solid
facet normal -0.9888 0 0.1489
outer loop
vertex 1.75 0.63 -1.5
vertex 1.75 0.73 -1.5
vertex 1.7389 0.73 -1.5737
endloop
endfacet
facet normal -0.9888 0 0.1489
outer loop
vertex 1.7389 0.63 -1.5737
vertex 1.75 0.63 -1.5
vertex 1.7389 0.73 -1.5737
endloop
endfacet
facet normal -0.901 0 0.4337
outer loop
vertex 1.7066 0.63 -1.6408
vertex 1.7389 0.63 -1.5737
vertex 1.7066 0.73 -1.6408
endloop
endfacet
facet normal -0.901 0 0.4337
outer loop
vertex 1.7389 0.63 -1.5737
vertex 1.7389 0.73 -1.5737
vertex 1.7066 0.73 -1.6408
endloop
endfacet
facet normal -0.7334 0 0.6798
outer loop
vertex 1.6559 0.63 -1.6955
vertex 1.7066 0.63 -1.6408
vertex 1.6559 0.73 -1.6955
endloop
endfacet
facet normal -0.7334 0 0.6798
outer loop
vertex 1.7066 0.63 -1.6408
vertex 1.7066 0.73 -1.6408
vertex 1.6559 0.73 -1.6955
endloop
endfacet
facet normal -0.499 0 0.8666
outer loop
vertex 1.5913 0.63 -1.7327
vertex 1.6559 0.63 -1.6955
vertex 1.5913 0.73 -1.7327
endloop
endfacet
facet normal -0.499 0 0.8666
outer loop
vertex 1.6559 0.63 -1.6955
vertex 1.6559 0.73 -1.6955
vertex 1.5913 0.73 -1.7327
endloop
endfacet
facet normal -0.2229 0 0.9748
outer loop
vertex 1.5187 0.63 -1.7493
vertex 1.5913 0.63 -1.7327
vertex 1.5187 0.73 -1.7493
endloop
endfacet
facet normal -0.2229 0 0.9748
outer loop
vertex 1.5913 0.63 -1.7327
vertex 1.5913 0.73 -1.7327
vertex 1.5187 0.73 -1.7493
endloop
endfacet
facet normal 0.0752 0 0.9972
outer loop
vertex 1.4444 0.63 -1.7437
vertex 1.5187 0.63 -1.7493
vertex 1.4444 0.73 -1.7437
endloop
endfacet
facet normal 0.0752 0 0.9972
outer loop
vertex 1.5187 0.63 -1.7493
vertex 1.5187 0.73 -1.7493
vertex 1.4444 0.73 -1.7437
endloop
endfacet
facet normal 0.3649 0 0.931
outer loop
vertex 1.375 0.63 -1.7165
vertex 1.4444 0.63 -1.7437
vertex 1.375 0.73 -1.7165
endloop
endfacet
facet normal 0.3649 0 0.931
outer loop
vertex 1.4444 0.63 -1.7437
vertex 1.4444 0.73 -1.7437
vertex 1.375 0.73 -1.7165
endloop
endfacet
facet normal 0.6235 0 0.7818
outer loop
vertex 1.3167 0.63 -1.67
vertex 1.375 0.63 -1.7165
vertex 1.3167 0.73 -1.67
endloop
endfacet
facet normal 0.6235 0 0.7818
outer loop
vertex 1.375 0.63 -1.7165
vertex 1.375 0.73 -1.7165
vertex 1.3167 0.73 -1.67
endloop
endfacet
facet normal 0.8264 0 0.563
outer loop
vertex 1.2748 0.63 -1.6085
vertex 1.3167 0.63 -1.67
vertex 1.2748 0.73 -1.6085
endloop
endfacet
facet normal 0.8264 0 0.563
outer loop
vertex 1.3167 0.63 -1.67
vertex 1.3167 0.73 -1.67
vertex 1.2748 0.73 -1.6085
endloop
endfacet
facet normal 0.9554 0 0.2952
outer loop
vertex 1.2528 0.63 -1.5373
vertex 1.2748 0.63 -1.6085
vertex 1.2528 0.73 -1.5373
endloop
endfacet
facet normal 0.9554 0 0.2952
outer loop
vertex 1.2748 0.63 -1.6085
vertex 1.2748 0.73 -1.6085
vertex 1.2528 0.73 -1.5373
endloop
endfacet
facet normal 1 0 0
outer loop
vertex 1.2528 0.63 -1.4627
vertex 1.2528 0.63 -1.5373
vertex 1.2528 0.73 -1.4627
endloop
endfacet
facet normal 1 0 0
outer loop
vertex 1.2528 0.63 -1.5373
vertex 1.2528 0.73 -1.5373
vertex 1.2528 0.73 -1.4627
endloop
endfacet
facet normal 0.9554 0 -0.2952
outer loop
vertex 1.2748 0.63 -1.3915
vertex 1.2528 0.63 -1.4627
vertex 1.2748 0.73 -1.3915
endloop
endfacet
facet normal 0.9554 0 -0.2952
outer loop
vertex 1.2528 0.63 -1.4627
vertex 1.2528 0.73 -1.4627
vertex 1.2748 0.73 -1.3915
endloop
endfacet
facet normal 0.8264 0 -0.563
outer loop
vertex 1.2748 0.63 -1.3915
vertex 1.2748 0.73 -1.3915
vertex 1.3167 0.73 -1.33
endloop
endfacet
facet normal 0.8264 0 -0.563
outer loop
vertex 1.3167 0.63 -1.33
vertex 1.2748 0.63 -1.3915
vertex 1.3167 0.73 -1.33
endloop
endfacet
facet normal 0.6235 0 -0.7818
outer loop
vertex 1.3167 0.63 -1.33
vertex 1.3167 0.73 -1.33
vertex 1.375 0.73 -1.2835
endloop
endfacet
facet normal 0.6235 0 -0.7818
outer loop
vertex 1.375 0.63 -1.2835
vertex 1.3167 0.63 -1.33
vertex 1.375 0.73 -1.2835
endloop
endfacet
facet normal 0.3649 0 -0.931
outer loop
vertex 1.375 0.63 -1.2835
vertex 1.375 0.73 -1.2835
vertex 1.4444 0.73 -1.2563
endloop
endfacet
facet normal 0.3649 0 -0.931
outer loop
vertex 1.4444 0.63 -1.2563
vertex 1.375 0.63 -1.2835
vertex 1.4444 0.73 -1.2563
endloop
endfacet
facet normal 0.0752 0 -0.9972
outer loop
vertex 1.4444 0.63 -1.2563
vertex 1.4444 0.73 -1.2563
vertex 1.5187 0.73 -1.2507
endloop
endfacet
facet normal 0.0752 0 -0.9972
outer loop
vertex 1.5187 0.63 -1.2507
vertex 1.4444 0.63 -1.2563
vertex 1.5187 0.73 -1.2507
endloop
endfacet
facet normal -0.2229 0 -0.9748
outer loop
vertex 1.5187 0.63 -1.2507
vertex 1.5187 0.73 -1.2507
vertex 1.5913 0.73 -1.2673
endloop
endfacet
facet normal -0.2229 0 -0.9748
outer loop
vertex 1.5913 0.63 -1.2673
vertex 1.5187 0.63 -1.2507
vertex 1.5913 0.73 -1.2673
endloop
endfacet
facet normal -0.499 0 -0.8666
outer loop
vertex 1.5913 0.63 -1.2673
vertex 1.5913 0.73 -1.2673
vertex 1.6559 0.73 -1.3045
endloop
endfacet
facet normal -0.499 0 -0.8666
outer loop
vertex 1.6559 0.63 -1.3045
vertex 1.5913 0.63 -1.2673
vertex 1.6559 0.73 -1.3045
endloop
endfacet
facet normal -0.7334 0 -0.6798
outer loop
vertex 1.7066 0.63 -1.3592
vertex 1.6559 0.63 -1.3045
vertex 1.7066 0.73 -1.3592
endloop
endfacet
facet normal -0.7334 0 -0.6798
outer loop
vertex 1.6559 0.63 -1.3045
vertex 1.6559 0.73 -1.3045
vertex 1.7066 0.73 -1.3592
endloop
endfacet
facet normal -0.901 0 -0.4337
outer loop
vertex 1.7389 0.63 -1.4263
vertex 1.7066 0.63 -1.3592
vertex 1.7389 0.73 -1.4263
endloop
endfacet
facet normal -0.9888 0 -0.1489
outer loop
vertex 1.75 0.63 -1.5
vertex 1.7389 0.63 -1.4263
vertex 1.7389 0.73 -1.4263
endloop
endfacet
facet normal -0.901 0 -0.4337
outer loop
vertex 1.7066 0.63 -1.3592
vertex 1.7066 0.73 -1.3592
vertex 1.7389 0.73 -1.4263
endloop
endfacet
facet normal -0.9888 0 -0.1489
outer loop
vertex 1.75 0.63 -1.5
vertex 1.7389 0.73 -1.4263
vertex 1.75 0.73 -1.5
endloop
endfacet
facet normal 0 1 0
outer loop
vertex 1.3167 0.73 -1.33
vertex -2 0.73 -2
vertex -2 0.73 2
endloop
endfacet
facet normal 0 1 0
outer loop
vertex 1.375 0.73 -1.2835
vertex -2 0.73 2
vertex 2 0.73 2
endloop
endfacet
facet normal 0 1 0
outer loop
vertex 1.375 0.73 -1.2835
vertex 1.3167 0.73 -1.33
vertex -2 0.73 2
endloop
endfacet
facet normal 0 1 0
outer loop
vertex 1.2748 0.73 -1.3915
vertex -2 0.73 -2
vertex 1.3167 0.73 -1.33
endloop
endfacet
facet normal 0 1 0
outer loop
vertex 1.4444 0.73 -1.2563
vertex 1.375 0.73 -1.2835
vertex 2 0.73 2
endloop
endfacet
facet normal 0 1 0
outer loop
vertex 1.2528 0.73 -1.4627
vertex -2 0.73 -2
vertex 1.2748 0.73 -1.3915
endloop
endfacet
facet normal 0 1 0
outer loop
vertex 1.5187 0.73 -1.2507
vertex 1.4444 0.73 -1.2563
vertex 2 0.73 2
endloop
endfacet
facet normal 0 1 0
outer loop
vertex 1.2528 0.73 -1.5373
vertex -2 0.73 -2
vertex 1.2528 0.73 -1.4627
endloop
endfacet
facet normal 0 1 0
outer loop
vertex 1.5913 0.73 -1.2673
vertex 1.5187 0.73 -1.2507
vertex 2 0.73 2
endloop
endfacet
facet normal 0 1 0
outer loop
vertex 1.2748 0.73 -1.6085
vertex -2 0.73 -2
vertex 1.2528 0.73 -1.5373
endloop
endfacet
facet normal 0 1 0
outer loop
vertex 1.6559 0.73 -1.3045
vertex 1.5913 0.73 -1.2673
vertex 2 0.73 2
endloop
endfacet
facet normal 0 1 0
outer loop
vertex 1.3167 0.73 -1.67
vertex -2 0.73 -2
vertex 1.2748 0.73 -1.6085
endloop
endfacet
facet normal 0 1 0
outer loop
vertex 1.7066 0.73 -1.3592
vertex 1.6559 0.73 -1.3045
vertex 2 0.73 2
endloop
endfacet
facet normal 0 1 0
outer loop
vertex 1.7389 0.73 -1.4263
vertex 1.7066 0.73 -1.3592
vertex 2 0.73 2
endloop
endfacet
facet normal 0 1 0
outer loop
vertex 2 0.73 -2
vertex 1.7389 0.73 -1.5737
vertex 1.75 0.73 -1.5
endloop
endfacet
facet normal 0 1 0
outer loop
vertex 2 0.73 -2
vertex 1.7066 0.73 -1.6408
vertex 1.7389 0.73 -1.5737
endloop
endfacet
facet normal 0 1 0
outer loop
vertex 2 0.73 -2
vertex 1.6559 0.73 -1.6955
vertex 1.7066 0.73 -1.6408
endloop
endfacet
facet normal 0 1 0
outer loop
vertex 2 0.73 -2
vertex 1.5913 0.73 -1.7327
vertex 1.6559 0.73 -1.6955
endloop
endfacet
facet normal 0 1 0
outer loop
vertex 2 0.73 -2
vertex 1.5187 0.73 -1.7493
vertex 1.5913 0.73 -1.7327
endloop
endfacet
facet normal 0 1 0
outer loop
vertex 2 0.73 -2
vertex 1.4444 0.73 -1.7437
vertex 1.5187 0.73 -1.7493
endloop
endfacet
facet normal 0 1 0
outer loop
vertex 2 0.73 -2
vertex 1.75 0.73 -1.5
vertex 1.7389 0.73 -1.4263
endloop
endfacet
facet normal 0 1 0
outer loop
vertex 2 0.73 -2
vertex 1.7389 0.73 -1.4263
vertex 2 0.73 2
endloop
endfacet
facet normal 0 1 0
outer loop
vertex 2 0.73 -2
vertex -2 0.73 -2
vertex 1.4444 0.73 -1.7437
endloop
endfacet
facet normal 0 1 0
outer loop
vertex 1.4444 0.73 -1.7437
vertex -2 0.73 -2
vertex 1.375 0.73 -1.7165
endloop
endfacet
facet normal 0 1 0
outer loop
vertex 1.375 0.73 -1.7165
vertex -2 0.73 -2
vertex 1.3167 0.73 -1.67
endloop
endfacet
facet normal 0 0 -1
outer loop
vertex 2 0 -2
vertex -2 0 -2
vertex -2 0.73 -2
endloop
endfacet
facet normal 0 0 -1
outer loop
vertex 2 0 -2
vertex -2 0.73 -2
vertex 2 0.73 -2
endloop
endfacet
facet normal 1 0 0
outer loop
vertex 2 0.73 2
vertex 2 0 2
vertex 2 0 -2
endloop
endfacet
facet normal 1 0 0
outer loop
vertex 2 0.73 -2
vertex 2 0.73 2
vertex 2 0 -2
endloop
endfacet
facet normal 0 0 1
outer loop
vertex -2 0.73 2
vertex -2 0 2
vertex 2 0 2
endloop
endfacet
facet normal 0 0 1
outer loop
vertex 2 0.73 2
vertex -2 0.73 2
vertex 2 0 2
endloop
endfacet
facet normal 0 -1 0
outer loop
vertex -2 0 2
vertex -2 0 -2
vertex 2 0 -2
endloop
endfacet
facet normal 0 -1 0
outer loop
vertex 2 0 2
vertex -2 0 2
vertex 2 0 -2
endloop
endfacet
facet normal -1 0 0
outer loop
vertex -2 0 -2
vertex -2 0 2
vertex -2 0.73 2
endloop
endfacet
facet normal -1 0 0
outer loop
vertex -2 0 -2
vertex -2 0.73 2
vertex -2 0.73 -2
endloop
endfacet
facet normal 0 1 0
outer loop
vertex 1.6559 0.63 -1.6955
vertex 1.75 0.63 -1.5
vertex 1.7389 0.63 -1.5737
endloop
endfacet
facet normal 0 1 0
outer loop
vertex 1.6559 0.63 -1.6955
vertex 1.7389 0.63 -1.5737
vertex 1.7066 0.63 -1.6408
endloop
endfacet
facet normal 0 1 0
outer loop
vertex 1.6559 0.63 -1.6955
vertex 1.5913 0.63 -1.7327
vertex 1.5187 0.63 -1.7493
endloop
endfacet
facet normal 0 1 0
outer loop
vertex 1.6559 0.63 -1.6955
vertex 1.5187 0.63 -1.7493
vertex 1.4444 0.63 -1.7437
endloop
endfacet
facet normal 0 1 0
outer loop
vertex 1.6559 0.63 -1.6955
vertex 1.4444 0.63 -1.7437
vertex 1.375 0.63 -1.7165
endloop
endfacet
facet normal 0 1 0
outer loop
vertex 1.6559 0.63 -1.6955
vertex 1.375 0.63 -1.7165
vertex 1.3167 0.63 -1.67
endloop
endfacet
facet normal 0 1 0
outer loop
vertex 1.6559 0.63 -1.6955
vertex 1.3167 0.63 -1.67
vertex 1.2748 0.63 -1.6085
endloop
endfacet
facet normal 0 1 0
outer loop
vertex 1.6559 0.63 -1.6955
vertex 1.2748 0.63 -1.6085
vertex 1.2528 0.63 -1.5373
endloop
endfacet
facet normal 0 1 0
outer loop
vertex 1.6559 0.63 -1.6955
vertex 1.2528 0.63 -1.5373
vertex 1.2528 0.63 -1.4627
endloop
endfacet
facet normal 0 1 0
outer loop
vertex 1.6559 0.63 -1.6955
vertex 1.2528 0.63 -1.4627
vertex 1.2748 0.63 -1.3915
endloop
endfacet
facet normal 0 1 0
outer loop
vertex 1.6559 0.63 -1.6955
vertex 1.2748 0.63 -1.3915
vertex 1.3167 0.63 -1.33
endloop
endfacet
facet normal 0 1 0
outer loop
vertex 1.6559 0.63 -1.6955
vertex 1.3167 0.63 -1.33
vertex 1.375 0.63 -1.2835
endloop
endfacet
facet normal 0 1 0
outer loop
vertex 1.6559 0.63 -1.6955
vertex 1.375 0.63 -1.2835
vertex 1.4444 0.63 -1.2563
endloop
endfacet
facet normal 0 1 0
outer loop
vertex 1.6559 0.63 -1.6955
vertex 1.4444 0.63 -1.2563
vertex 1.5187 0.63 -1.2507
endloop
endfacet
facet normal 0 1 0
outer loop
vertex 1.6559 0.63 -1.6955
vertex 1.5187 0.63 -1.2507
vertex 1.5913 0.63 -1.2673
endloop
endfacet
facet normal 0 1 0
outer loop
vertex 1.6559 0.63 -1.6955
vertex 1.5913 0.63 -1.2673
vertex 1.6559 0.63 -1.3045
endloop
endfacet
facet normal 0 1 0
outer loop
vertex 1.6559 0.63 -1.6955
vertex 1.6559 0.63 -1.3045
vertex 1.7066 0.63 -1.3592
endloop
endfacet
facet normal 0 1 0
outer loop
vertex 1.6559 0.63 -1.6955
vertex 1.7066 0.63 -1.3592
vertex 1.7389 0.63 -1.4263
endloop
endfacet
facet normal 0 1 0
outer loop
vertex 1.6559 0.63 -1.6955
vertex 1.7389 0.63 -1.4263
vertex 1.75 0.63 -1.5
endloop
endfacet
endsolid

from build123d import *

# Parameters (mm, degrees)
SKETCH1_W           = 4
SKETCH1_H           = 4
BOSS_EXTRUDE1_DEPTH = 0.73
SKETCH2_R           = 0.25
CUT_EXTRUDE1_DEPTH  = 0.1


with BuildPart() as part:
    # Sketch1 → Boss-Extrude1 (new body)
    with BuildSketch(Plane(origin=(0, 0, 0), x_dir=(1, 0, 0), z_dir=(0, 1, 0))):
        Rectangle(SKETCH1_W, SKETCH1_H)
    extrude(amount=BOSS_EXTRUDE1_DEPTH)

    # Sketch2 → Cut-Extrude1 (cut)
    with BuildSketch(Plane(origin=(0, 0.73, 0), x_dir=(1, 0, 0), z_dir=(0, 1, 0))):
        with Locations((1.5, 1.5)):
            Circle(SKETCH2_R)
    extrude(amount=-CUT_EXTRUDE1_DEPTH, mode=Mode.SUBTRACT)


solid = part.part
